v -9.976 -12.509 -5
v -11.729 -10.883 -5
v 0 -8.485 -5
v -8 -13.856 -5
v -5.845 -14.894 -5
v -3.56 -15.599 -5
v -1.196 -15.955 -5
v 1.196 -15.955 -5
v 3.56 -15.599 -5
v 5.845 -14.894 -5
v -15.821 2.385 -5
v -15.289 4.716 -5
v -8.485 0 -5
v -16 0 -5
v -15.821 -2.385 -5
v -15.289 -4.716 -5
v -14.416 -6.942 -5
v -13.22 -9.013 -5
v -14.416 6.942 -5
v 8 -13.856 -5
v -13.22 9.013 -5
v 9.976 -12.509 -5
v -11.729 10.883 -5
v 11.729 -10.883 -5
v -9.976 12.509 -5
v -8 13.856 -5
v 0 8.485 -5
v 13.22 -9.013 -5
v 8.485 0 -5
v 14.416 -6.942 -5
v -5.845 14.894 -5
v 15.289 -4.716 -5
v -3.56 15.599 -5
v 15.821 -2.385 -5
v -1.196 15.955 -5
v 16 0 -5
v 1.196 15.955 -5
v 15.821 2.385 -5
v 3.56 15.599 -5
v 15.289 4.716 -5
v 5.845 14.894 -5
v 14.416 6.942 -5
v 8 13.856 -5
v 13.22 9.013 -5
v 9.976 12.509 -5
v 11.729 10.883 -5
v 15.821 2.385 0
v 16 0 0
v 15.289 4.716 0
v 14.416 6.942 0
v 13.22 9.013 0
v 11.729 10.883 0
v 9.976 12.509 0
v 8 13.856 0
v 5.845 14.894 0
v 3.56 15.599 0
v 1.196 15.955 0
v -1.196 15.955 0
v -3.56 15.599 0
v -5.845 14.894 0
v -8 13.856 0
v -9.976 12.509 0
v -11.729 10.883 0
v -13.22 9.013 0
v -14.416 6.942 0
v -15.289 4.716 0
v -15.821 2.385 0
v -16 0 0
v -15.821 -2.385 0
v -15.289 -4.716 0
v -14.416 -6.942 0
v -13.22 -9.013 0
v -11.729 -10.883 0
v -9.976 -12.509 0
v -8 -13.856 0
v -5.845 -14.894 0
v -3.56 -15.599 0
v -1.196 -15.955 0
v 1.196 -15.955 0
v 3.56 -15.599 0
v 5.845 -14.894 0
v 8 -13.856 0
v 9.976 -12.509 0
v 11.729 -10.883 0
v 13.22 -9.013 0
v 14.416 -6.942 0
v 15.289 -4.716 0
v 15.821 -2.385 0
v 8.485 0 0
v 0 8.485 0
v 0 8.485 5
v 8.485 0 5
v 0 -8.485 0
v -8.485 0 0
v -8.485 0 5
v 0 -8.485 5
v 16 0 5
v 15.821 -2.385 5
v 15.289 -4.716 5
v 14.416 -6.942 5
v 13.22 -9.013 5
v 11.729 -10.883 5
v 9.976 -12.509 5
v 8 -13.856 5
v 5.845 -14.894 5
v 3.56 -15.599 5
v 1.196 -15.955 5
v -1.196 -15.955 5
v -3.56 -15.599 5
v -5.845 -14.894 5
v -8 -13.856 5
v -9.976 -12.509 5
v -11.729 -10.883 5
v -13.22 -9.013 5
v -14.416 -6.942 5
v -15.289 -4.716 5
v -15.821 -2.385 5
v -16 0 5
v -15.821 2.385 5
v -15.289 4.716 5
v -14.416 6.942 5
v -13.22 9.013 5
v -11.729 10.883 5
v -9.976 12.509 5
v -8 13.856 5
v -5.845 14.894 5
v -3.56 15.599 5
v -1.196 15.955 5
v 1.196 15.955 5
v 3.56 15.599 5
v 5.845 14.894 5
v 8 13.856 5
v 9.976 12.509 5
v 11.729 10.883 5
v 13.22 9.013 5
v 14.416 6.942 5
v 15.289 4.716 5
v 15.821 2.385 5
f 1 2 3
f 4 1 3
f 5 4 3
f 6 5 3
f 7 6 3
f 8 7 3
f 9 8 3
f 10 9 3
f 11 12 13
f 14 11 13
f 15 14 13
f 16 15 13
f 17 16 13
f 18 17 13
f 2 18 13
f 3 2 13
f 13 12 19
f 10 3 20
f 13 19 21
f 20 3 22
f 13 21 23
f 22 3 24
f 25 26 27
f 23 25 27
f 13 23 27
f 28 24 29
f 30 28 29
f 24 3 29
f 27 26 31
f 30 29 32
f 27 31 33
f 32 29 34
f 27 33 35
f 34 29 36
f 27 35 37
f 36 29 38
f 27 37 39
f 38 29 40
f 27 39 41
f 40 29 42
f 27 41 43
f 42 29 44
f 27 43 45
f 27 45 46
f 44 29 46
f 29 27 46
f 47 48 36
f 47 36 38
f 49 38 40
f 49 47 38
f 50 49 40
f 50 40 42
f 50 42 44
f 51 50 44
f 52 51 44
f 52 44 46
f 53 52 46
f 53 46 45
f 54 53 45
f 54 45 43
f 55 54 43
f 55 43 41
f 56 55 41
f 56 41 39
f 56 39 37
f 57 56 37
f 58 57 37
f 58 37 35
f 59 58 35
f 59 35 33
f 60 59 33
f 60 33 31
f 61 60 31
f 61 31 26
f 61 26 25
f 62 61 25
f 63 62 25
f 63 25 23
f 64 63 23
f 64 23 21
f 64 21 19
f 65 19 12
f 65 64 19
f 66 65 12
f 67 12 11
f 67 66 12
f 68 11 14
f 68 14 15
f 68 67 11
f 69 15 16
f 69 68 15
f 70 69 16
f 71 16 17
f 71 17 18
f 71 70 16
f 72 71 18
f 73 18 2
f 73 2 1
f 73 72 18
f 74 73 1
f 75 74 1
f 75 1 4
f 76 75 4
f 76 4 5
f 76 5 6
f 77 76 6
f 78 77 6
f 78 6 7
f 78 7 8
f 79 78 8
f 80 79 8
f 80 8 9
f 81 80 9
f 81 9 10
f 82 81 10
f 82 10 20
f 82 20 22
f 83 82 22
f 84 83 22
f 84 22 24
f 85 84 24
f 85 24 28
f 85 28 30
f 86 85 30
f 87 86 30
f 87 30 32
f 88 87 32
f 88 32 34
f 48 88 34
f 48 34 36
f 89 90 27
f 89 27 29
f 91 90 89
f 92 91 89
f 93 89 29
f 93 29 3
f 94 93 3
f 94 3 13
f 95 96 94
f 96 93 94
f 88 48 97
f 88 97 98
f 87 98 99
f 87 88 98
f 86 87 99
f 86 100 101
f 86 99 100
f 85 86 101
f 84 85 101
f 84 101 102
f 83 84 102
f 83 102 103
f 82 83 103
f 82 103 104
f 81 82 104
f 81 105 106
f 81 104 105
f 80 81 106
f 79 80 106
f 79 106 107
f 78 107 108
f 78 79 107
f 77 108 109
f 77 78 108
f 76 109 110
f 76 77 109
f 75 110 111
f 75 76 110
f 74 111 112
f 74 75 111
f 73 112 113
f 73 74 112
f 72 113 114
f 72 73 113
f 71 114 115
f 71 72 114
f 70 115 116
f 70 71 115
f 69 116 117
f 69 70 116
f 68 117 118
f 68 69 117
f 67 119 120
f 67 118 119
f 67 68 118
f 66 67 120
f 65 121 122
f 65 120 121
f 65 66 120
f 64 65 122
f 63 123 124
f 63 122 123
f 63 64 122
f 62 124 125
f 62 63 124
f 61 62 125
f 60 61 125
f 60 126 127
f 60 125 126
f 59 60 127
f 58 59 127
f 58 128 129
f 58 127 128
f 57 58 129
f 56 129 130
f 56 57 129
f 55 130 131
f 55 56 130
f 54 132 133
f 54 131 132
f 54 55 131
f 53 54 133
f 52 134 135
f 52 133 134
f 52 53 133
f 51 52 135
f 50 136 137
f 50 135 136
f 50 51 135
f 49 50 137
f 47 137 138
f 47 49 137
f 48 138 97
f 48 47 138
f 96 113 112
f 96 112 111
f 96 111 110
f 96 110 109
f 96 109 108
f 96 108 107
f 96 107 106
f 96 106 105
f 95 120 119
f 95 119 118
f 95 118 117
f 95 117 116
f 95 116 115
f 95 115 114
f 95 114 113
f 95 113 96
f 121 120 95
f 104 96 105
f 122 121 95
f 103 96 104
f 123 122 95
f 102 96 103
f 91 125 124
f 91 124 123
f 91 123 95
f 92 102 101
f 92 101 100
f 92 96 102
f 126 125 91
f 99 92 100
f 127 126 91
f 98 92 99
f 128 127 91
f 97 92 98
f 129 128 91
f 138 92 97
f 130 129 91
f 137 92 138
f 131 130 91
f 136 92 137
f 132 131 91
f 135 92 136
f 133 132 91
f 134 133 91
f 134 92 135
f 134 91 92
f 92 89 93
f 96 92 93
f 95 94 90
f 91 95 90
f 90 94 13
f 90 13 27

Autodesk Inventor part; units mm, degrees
ref_plane "YZ Plane" through (0, 0, 0) normal (1, 0, 0) x (0, 1, 0)
ref_plane "XZ Plane" through (0, 0, 0) normal (0, 1, 0) x (-1, 0, 0)
ref_plane "XY Plane" through (0, 0, 0) normal (0, 0, 1) x (1, 0, 0)
sketch "Эскиз1" plane through (0, 0, 0) normal (0, 0, 1) x (1, 0, 0)
  circle A0 centre (0, 0) radius 16
  line L0 (0, 8.4853) -> (8.4853, 0)
  line L1 (8.4853, 0) -> (0, -8.4853)
  line L2 (0, -8.4853) -> (-8.4853, 0)
  line L3 (-8.4853, 0) -> (0, 8.4853)
  dimension "d0" = 32
  dimension "d1" = 12
extrude "Выдавливание1" add sketch "Эскиз1" along normal mid plane 10
properties part number "7"
